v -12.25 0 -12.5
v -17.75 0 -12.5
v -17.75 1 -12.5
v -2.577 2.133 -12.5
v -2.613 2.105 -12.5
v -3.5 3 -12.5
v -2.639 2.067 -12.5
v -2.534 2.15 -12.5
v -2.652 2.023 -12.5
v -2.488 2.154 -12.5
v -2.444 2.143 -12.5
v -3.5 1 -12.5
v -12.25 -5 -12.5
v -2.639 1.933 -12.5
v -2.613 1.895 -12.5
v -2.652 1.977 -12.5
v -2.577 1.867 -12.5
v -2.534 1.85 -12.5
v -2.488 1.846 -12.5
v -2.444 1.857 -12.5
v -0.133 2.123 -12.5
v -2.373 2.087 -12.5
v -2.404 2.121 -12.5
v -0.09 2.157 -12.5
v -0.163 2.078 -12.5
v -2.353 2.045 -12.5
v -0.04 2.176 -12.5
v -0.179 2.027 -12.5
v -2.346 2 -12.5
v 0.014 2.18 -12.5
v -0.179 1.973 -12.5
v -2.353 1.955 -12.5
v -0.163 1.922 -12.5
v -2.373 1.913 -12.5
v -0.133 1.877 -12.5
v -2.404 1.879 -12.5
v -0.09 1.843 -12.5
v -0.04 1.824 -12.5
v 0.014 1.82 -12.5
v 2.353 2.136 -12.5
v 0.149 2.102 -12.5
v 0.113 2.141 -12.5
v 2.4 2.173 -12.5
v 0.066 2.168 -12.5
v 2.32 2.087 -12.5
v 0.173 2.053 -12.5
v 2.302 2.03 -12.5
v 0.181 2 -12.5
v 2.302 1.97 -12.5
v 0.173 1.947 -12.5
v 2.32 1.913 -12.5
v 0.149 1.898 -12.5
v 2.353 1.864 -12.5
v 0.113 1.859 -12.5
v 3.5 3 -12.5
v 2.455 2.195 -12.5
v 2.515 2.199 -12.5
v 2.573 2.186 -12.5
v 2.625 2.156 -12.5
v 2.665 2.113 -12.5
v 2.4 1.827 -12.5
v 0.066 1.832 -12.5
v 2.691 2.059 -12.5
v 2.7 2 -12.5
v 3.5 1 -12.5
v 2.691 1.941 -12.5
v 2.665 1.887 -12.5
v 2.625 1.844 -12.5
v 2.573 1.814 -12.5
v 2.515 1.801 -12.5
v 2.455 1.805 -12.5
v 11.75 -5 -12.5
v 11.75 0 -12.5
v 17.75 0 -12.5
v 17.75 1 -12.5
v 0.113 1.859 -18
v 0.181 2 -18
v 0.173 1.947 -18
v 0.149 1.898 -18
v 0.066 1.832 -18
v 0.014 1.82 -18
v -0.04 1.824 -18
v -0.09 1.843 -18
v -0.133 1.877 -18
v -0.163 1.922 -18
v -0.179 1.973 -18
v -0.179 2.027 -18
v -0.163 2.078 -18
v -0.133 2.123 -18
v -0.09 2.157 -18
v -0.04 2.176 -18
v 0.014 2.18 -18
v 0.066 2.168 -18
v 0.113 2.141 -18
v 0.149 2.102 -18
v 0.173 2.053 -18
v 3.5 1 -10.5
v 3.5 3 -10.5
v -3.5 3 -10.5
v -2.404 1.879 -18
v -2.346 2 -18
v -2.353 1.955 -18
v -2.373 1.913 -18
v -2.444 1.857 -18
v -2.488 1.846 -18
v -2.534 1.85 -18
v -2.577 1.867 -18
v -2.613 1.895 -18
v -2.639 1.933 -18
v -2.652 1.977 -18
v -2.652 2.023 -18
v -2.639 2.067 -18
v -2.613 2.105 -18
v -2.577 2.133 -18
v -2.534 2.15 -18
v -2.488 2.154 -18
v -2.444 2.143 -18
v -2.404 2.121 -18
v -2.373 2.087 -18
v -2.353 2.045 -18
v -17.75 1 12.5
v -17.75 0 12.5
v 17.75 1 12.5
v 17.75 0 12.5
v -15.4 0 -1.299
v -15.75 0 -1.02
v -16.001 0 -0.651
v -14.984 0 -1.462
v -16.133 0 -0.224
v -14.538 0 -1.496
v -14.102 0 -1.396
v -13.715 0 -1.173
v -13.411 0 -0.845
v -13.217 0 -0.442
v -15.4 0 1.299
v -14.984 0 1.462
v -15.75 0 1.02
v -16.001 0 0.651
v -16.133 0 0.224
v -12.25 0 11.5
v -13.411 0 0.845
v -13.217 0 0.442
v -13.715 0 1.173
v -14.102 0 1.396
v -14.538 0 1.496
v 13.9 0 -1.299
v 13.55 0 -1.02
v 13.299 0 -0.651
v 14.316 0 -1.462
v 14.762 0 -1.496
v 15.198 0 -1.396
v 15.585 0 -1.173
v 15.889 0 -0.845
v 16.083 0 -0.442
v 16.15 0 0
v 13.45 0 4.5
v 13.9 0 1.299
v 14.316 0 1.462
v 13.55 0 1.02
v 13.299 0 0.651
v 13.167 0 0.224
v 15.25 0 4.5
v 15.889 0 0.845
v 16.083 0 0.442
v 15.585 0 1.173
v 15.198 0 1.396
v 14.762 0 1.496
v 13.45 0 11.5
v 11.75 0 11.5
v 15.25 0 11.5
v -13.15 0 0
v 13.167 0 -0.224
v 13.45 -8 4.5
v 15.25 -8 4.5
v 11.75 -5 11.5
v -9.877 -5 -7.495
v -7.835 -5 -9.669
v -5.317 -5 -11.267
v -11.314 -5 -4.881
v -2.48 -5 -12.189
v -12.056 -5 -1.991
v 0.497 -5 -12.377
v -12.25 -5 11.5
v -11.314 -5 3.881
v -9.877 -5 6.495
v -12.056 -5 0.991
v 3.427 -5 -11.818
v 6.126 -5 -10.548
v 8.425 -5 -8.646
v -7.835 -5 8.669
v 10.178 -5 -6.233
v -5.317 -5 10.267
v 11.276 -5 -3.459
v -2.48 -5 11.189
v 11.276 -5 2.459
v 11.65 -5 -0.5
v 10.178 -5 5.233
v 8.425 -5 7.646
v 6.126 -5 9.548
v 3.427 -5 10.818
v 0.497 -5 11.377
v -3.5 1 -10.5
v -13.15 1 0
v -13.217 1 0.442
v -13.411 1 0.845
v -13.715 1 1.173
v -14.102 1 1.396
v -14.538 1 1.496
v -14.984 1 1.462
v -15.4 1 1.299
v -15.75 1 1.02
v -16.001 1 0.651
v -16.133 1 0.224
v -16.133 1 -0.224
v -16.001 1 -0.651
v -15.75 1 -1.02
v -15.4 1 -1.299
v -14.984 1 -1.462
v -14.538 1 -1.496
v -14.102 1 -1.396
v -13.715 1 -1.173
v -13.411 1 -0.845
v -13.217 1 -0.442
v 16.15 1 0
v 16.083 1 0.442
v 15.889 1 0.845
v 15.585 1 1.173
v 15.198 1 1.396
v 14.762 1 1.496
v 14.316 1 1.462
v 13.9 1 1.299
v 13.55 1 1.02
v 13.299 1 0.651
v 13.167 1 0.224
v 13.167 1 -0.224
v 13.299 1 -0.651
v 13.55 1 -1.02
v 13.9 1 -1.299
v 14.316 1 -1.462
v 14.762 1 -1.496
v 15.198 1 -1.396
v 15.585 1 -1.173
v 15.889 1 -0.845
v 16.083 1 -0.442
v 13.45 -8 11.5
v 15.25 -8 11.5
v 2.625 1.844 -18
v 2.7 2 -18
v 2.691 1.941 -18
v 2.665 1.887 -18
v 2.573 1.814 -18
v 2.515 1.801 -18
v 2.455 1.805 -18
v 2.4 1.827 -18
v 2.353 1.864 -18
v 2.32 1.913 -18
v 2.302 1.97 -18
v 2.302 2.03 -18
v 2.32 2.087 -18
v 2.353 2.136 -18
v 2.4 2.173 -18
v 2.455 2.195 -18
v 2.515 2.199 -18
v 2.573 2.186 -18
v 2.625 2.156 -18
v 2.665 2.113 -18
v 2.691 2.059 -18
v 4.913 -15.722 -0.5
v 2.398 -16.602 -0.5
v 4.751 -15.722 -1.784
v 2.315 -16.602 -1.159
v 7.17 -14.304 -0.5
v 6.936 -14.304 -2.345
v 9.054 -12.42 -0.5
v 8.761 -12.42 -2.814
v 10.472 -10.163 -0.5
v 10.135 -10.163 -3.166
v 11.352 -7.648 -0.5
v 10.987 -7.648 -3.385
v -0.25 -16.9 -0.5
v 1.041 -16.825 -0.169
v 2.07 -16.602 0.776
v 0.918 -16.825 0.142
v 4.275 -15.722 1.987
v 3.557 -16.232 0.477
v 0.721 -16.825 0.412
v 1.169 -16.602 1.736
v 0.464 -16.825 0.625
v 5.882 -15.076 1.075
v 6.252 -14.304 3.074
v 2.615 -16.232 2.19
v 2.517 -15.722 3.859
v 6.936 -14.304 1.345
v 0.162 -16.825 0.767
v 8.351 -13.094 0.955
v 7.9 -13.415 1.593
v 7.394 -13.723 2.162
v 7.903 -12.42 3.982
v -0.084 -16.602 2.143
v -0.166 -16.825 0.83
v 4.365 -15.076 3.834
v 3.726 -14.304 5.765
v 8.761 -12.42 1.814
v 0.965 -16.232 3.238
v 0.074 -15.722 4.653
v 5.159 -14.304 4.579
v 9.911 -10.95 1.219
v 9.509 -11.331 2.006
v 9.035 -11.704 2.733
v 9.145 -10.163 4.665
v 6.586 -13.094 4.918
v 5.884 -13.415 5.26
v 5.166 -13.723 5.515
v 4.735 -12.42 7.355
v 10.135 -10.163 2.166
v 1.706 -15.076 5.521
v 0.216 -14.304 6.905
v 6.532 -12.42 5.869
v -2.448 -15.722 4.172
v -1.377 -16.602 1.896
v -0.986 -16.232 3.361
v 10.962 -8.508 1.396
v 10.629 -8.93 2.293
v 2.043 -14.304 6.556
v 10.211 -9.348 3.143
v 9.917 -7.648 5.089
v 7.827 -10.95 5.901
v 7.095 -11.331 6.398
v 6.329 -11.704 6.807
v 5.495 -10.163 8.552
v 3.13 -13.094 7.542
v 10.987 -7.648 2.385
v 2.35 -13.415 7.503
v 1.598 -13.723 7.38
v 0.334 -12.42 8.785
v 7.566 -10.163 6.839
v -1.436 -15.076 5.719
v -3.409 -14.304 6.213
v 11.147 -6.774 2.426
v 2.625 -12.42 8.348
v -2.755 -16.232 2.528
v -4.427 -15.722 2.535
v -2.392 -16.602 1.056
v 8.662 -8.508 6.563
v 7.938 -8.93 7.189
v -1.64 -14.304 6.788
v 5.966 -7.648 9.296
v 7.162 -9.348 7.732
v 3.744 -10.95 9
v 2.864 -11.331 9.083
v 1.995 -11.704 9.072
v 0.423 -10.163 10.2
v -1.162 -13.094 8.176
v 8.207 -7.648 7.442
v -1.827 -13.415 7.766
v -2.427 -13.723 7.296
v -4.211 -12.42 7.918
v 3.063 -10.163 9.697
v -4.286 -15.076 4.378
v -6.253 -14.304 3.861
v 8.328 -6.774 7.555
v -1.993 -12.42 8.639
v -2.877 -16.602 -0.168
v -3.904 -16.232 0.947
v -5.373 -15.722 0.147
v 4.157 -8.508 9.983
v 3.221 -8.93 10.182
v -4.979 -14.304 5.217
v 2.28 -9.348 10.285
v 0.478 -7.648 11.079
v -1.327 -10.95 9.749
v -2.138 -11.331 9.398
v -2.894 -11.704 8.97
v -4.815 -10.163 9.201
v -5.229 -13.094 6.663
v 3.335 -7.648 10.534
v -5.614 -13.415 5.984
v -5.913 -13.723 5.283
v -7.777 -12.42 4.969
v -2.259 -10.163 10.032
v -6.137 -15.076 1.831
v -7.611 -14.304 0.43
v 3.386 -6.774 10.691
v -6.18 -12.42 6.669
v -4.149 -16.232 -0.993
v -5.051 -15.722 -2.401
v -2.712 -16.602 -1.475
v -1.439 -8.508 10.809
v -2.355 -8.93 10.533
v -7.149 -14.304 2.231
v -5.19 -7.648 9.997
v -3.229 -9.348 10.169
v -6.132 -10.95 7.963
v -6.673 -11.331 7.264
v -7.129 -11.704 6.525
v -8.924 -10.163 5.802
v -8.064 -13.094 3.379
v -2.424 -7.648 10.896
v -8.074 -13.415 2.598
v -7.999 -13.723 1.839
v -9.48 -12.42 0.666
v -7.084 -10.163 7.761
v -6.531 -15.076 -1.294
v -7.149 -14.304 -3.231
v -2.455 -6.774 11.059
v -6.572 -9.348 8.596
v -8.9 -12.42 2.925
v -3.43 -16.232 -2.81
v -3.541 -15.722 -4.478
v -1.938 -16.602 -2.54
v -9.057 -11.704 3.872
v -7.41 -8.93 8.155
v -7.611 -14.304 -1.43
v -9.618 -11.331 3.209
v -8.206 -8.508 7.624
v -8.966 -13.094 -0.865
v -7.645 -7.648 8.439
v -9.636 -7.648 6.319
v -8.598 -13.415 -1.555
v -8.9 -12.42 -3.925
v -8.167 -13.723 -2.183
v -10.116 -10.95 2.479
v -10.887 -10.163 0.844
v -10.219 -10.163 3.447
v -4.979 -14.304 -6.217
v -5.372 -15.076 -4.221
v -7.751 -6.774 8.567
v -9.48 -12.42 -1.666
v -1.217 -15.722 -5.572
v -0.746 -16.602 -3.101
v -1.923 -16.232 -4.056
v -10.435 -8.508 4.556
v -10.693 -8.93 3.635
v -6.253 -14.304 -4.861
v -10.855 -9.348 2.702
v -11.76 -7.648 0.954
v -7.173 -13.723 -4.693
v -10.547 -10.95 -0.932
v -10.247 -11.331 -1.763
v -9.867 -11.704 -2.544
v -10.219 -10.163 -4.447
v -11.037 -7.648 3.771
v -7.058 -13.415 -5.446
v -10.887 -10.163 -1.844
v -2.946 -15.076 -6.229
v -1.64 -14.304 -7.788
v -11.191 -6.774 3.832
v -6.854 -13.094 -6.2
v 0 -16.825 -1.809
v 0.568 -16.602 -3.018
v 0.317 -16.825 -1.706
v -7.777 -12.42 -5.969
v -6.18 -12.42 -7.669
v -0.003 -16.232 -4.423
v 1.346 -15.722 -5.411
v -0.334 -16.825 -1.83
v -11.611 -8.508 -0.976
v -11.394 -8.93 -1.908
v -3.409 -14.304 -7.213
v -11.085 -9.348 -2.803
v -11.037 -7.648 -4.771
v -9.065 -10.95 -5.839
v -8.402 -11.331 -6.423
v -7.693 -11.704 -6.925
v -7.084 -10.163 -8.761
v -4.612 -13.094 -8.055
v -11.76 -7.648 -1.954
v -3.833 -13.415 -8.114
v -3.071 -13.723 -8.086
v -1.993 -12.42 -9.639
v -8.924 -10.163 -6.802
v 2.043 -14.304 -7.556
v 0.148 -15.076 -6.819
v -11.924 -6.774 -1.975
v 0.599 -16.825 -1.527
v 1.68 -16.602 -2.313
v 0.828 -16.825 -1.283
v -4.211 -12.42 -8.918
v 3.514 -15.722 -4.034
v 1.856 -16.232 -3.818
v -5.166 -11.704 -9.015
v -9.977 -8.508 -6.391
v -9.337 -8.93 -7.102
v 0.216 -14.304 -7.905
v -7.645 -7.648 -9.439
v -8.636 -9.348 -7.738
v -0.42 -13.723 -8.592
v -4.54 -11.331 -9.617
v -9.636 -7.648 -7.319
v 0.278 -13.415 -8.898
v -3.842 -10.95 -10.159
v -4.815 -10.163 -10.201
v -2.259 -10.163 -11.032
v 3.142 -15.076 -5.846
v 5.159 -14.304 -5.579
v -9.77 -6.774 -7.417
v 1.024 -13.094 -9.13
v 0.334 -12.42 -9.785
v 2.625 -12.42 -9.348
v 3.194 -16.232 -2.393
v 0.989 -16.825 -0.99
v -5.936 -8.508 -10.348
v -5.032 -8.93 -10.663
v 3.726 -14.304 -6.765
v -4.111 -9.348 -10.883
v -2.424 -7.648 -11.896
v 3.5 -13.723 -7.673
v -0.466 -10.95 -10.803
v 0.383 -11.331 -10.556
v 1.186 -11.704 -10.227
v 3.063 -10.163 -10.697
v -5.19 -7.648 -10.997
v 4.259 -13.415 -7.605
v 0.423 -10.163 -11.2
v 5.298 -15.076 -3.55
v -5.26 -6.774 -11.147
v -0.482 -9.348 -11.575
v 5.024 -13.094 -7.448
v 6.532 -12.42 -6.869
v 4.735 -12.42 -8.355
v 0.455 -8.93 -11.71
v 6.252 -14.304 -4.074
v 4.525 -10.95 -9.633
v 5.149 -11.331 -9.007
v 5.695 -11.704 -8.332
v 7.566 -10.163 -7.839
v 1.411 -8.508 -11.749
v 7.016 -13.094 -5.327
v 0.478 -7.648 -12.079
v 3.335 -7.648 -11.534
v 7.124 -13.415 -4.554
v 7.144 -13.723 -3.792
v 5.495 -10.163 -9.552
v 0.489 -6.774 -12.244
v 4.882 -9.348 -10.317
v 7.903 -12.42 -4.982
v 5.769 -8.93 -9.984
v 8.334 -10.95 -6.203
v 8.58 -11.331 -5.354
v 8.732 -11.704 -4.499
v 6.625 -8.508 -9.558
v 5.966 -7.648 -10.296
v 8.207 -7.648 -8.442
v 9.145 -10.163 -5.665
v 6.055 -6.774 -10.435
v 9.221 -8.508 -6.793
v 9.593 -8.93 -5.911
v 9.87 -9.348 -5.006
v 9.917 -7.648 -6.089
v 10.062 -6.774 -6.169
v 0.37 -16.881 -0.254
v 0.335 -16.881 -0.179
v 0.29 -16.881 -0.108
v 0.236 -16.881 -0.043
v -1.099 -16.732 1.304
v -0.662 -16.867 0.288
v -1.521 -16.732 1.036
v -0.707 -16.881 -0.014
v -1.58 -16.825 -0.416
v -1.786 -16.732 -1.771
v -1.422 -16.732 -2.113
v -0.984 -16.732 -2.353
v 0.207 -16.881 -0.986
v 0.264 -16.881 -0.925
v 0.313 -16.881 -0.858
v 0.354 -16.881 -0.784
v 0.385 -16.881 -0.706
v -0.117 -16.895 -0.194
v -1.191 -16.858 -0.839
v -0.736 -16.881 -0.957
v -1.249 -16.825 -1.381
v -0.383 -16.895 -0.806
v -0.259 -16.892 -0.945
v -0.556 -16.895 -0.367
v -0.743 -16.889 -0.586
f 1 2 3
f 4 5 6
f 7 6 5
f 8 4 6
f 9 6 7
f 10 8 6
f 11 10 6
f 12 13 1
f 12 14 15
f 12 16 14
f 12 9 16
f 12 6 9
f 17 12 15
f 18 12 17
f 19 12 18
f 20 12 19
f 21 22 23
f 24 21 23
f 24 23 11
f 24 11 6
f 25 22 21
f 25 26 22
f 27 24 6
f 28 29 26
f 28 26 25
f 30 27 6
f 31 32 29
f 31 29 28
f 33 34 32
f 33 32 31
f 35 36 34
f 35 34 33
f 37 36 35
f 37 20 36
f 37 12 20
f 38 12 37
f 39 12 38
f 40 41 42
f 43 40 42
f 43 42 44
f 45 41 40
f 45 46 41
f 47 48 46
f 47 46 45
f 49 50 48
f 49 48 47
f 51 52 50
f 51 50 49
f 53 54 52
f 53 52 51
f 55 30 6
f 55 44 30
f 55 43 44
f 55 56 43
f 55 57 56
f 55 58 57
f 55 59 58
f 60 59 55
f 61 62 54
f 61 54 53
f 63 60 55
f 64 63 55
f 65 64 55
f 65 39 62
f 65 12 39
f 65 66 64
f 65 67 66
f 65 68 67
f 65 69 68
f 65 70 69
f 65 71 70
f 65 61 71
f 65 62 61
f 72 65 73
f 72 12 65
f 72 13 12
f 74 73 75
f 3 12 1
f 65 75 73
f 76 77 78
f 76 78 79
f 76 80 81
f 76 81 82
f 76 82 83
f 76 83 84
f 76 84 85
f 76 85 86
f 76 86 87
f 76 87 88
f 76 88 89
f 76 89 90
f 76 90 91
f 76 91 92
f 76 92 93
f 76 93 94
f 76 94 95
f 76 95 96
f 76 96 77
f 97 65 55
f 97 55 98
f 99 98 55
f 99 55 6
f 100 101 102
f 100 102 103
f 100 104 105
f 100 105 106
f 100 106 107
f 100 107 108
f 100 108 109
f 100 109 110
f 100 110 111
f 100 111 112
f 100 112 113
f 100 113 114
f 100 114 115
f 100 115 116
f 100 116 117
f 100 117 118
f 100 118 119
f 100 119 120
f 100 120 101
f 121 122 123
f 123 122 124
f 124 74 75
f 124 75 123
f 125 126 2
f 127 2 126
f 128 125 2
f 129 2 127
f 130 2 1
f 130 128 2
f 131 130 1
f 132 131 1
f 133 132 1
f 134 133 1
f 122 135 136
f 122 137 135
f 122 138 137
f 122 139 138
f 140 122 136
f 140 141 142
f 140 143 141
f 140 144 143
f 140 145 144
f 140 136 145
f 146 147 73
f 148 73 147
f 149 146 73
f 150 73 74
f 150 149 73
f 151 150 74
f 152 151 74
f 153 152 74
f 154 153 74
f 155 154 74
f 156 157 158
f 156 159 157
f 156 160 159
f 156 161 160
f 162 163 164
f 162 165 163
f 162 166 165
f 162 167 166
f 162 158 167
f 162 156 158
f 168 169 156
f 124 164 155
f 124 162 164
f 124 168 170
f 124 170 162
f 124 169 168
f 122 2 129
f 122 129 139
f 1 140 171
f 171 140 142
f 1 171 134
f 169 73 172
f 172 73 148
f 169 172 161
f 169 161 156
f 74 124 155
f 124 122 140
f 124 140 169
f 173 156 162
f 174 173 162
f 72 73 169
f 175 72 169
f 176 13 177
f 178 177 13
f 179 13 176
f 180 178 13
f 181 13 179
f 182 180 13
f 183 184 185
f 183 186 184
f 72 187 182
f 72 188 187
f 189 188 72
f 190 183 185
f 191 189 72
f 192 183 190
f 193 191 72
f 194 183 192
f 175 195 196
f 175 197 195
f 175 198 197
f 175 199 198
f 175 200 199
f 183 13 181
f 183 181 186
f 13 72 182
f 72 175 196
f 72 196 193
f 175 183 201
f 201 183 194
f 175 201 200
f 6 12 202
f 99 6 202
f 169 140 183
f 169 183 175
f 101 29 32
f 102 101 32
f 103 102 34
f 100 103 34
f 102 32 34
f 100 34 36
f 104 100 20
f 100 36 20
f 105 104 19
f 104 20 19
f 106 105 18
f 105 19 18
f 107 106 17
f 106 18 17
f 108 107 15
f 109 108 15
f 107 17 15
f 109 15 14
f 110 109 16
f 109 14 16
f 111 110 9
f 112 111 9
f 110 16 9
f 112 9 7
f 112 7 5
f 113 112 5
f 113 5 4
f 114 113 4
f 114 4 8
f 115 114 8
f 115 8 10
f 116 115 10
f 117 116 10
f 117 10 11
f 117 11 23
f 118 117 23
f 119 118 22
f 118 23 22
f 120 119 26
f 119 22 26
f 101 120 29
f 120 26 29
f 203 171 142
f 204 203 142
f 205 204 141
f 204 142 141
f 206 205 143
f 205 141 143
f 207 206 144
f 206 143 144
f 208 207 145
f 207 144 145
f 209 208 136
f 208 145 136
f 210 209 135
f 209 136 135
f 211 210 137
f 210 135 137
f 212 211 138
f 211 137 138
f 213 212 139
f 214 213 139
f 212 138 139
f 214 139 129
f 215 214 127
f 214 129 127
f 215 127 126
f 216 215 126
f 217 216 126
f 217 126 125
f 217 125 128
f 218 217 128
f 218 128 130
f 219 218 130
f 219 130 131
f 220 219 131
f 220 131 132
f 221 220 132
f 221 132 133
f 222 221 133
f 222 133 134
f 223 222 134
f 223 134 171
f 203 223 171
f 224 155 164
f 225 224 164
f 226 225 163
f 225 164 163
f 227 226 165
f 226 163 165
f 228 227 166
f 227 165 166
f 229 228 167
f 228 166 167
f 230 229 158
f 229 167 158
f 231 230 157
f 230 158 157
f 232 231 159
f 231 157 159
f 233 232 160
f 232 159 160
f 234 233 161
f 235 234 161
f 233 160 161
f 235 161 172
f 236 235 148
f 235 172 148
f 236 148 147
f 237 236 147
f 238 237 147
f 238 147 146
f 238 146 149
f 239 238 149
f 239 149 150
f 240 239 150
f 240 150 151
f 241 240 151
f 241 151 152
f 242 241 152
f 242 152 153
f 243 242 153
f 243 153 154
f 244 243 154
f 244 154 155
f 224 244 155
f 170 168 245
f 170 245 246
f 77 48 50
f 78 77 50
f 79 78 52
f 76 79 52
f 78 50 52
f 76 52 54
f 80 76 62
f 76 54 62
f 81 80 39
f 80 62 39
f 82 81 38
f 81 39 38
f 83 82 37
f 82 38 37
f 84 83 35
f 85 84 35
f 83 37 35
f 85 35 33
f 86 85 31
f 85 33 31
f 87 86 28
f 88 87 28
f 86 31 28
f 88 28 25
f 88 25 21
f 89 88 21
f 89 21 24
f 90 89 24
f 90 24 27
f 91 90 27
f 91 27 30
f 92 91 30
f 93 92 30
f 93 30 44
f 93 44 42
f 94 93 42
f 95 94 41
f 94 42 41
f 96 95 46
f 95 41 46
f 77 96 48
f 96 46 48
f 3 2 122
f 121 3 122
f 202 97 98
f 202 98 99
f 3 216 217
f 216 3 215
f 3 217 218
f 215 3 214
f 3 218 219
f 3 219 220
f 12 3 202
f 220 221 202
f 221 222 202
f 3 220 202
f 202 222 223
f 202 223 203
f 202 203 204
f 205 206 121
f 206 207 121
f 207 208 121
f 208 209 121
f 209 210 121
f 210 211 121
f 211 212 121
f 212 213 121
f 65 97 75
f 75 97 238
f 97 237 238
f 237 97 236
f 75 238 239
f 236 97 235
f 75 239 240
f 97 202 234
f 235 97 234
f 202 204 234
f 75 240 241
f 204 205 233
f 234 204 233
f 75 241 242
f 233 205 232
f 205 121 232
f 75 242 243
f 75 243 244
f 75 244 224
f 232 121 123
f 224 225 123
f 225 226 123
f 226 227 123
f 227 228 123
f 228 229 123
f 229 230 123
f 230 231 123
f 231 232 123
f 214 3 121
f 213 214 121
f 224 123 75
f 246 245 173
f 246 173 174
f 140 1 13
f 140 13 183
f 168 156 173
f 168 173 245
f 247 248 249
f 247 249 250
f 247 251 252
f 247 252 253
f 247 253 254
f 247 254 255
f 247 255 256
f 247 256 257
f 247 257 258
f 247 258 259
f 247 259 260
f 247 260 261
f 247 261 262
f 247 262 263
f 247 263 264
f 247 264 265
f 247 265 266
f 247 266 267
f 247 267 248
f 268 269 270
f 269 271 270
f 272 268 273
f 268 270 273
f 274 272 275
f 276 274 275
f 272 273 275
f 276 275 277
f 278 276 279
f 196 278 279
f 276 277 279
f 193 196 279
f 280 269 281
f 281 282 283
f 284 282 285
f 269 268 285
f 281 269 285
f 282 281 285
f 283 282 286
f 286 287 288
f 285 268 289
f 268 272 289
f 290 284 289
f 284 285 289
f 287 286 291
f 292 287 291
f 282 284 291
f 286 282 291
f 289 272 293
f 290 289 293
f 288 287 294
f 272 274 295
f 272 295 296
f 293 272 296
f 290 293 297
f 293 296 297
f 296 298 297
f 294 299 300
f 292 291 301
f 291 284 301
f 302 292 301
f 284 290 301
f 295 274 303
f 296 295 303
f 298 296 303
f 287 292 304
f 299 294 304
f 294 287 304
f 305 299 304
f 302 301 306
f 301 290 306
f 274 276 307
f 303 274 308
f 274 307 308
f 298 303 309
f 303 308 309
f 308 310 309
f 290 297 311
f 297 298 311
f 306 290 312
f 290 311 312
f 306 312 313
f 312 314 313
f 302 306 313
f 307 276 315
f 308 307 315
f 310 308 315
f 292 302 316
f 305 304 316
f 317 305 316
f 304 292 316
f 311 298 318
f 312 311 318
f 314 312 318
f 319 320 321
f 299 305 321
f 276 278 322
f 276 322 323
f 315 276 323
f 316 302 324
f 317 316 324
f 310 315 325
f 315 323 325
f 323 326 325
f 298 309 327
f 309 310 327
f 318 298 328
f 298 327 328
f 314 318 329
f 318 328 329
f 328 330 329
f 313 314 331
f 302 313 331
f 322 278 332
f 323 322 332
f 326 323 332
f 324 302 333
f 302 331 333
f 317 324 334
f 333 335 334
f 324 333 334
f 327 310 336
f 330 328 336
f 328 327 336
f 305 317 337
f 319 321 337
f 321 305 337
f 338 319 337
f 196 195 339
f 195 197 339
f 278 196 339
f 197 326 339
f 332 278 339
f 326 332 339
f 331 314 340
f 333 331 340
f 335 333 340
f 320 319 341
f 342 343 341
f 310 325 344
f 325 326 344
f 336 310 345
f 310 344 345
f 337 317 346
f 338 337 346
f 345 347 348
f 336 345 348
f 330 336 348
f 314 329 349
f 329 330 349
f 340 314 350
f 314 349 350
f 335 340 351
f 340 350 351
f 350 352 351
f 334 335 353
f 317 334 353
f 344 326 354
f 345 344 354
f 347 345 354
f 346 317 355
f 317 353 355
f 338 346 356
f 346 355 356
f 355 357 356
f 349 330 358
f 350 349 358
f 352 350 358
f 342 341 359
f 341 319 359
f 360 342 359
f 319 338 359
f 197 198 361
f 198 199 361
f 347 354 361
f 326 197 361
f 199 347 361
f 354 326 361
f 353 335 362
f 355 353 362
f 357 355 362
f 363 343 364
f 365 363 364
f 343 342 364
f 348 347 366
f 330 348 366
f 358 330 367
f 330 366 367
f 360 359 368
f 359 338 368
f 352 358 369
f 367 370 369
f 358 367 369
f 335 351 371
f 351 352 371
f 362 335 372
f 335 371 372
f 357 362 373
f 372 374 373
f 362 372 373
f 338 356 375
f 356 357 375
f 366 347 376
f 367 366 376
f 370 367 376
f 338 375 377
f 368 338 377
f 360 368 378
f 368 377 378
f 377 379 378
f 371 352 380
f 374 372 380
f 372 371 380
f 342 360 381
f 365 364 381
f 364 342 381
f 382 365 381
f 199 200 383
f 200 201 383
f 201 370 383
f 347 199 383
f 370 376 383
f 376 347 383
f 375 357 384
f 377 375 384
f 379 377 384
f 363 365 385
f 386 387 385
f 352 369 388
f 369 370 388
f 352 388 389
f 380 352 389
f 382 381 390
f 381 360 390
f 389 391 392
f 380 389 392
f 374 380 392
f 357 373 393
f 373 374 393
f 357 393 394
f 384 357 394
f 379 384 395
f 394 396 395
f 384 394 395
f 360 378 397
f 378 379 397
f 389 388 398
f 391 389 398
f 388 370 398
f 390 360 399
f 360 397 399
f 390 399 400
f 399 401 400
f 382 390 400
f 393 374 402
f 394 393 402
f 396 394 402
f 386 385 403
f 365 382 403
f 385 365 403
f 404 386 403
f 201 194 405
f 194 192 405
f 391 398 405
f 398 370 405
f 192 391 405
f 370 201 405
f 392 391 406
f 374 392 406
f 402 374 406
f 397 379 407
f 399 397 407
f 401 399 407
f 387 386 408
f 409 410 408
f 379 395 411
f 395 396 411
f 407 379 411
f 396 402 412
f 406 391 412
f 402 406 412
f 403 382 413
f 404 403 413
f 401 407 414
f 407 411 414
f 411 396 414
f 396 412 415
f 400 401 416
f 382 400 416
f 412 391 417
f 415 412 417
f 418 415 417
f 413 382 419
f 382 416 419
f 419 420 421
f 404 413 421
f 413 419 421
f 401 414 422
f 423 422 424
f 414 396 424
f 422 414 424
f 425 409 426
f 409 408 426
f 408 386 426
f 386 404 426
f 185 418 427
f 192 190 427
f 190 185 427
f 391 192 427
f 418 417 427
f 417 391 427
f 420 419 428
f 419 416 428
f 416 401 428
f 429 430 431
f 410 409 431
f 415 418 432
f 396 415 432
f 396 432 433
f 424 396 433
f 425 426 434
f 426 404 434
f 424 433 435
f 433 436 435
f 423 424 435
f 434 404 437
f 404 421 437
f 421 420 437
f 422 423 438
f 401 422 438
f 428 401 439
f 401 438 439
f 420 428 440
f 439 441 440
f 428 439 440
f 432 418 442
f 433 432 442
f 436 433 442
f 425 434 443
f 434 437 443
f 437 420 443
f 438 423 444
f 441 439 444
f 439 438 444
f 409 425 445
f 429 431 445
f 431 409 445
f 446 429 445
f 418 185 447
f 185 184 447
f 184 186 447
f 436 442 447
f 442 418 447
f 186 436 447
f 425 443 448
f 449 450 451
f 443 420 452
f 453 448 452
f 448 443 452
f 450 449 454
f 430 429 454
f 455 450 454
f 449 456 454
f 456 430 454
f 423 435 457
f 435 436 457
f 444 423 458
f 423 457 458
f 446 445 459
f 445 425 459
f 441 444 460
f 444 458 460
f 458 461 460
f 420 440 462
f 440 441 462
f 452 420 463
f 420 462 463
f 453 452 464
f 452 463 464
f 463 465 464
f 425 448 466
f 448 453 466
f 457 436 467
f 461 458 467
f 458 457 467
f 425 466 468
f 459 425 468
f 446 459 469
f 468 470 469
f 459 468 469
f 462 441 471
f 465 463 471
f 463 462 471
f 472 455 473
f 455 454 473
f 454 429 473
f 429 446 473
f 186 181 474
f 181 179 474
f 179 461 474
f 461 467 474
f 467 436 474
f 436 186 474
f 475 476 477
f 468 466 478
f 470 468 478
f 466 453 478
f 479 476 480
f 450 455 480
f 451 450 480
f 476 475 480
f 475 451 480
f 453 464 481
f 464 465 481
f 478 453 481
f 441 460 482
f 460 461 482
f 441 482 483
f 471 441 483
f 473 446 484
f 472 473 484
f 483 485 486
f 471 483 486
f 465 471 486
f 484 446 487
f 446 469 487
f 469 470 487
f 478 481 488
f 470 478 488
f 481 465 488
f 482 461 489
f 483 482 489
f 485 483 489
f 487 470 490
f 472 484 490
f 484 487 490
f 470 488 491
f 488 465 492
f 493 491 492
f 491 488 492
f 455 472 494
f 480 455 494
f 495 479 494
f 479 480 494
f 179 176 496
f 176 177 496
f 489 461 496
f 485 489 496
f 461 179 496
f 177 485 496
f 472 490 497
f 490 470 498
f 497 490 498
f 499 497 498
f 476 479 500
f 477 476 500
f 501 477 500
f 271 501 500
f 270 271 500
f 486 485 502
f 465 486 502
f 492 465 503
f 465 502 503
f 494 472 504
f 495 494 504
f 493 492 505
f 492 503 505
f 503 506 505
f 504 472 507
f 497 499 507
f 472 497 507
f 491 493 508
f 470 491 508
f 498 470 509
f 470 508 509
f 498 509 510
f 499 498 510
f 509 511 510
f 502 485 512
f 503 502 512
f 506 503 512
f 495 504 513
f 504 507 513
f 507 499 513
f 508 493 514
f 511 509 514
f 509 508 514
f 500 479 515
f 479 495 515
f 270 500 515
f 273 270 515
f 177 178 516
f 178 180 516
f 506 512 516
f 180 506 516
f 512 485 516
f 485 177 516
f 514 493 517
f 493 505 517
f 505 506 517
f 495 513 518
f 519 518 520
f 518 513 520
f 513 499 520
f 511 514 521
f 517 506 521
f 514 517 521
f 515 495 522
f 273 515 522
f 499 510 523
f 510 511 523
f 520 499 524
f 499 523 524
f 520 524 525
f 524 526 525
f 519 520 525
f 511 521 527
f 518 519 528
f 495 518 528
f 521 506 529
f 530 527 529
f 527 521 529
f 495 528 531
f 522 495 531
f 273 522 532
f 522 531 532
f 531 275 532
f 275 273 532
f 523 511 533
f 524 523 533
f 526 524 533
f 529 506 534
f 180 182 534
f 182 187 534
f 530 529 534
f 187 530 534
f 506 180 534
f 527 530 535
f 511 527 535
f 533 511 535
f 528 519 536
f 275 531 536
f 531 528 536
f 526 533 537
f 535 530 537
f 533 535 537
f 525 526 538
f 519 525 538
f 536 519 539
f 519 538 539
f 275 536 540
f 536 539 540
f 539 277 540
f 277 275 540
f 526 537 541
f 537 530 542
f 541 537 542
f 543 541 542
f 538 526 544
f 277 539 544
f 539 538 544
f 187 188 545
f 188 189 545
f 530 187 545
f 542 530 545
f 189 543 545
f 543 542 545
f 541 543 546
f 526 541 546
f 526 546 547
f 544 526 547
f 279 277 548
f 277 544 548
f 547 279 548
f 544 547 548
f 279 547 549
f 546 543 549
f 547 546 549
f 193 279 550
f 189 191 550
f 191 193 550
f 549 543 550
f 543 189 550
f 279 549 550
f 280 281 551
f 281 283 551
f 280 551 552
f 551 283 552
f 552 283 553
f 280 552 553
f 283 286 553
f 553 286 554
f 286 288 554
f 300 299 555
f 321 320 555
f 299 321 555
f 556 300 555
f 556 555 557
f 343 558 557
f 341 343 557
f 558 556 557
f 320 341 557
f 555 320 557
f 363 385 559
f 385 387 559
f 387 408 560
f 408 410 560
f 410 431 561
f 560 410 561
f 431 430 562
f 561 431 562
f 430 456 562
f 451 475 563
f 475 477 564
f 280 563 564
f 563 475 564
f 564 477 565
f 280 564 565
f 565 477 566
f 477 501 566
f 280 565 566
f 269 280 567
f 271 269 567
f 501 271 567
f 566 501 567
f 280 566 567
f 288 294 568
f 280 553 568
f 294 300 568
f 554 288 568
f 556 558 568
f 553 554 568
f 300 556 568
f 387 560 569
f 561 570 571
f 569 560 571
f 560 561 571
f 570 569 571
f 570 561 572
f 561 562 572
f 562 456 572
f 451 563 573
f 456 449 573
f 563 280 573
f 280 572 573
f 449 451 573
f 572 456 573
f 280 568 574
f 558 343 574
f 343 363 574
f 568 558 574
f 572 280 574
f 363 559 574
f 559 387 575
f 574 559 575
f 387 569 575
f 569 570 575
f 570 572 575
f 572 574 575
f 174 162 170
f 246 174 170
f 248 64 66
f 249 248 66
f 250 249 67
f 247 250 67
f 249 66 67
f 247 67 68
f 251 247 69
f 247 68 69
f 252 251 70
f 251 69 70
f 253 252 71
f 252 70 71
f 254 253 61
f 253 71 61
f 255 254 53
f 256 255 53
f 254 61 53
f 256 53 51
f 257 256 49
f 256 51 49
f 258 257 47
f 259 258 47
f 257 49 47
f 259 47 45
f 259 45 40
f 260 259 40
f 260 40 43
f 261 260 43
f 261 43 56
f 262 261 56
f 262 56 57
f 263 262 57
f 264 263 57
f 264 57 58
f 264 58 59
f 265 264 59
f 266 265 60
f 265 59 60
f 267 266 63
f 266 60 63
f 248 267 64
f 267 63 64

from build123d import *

# Parameters (mm, degrees)
F0_W      = 35.5
F0_H      = 25
F1_DEPTH  = 1
F2_W      = 24
F2_H      = 24
F3_DEPTH  = 5
F7_W      = 1.8
F7_H      = 7
F8_DEPTH  = 8
F9_R      = 1.5
F10_DEPTH = 25
F11_W     = 7
F11_H     = 2
F12_DEPTH = 2
F13_R     = 0.2
F13_R_2   = 0.180913
F13_R_3   = 0.154128
F14_DEPTH = 5.5


with BuildPart() as f1:
    # F0 (on Front) → F1 (new body)
    with BuildSketch(Plane.XZ):
        Rectangle(F0_W, F0_H)
    extrude(amount=-F1_DEPTH)

    # F2 (on face) → F3 (join)
    with BuildSketch(Plane.XZ):
        with Locations((-0.25, -0.5)):
            Rectangle(F2_W, F2_H)
    extrude(amount=F3_DEPTH)

    # F5 (on offset) → F6 (revolve)
    with BuildSketch(Plane.XY.offset(-0.5)):
        with BuildLine():
            ThreePointArc((-0.25, -16.9), (8.164571, -13.414571), (11.65, -5))
            Line((11.65, -5), (-0.25, -5))
            Line((-0.25, -5), (-0.25, -16.9))
        make_face()
    revolve(axis=Axis((-0.25, -10.95, -0.5), (0, -1, 0)))

    # F7 (on face) → F8 (join)
    with BuildSketch(Plane.XZ):
        with Locations((14.35, 8)):
            Rectangle(F7_W, F7_H)
    extrude(amount=F8_DEPTH)

    # F9 (on face) → F10 (cut)
    with BuildSketch(Plane.XZ):
        with Locations((-14.65, 0)):
            Circle(F9_R)
        with Locations((14.65, 0)):
            Circle(F9_R)
    extrude(amount=-F10_DEPTH, mode=Mode.SUBTRACT)

    # F11 (on face) → F12 (join)
    with BuildSketch(Plane(origin=(0, 1, 0), x_dir=(-1, 0, 0), z_dir=(0, 1, 0))):
        with Locations((0, -11.5)):
            Rectangle(F11_W, F11_H)
    extrude(amount=F12_DEPTH)

    # F13 (on face) → F14 (join)
    with BuildSketch(Plane(origin=(0, 0, -12.5), x_dir=(1, 0, 0), z_dir=(0, 0, -1))):
        with Locations((2.5, -2)):
            Circle(F13_R)
        with Locations((0, -2)):
            Circle(F13_R_2)
        with Locations((-2.5, -2)):
            Circle(F13_R_3)
    extrude(amount=F14_DEPTH)


solid = f1.part
